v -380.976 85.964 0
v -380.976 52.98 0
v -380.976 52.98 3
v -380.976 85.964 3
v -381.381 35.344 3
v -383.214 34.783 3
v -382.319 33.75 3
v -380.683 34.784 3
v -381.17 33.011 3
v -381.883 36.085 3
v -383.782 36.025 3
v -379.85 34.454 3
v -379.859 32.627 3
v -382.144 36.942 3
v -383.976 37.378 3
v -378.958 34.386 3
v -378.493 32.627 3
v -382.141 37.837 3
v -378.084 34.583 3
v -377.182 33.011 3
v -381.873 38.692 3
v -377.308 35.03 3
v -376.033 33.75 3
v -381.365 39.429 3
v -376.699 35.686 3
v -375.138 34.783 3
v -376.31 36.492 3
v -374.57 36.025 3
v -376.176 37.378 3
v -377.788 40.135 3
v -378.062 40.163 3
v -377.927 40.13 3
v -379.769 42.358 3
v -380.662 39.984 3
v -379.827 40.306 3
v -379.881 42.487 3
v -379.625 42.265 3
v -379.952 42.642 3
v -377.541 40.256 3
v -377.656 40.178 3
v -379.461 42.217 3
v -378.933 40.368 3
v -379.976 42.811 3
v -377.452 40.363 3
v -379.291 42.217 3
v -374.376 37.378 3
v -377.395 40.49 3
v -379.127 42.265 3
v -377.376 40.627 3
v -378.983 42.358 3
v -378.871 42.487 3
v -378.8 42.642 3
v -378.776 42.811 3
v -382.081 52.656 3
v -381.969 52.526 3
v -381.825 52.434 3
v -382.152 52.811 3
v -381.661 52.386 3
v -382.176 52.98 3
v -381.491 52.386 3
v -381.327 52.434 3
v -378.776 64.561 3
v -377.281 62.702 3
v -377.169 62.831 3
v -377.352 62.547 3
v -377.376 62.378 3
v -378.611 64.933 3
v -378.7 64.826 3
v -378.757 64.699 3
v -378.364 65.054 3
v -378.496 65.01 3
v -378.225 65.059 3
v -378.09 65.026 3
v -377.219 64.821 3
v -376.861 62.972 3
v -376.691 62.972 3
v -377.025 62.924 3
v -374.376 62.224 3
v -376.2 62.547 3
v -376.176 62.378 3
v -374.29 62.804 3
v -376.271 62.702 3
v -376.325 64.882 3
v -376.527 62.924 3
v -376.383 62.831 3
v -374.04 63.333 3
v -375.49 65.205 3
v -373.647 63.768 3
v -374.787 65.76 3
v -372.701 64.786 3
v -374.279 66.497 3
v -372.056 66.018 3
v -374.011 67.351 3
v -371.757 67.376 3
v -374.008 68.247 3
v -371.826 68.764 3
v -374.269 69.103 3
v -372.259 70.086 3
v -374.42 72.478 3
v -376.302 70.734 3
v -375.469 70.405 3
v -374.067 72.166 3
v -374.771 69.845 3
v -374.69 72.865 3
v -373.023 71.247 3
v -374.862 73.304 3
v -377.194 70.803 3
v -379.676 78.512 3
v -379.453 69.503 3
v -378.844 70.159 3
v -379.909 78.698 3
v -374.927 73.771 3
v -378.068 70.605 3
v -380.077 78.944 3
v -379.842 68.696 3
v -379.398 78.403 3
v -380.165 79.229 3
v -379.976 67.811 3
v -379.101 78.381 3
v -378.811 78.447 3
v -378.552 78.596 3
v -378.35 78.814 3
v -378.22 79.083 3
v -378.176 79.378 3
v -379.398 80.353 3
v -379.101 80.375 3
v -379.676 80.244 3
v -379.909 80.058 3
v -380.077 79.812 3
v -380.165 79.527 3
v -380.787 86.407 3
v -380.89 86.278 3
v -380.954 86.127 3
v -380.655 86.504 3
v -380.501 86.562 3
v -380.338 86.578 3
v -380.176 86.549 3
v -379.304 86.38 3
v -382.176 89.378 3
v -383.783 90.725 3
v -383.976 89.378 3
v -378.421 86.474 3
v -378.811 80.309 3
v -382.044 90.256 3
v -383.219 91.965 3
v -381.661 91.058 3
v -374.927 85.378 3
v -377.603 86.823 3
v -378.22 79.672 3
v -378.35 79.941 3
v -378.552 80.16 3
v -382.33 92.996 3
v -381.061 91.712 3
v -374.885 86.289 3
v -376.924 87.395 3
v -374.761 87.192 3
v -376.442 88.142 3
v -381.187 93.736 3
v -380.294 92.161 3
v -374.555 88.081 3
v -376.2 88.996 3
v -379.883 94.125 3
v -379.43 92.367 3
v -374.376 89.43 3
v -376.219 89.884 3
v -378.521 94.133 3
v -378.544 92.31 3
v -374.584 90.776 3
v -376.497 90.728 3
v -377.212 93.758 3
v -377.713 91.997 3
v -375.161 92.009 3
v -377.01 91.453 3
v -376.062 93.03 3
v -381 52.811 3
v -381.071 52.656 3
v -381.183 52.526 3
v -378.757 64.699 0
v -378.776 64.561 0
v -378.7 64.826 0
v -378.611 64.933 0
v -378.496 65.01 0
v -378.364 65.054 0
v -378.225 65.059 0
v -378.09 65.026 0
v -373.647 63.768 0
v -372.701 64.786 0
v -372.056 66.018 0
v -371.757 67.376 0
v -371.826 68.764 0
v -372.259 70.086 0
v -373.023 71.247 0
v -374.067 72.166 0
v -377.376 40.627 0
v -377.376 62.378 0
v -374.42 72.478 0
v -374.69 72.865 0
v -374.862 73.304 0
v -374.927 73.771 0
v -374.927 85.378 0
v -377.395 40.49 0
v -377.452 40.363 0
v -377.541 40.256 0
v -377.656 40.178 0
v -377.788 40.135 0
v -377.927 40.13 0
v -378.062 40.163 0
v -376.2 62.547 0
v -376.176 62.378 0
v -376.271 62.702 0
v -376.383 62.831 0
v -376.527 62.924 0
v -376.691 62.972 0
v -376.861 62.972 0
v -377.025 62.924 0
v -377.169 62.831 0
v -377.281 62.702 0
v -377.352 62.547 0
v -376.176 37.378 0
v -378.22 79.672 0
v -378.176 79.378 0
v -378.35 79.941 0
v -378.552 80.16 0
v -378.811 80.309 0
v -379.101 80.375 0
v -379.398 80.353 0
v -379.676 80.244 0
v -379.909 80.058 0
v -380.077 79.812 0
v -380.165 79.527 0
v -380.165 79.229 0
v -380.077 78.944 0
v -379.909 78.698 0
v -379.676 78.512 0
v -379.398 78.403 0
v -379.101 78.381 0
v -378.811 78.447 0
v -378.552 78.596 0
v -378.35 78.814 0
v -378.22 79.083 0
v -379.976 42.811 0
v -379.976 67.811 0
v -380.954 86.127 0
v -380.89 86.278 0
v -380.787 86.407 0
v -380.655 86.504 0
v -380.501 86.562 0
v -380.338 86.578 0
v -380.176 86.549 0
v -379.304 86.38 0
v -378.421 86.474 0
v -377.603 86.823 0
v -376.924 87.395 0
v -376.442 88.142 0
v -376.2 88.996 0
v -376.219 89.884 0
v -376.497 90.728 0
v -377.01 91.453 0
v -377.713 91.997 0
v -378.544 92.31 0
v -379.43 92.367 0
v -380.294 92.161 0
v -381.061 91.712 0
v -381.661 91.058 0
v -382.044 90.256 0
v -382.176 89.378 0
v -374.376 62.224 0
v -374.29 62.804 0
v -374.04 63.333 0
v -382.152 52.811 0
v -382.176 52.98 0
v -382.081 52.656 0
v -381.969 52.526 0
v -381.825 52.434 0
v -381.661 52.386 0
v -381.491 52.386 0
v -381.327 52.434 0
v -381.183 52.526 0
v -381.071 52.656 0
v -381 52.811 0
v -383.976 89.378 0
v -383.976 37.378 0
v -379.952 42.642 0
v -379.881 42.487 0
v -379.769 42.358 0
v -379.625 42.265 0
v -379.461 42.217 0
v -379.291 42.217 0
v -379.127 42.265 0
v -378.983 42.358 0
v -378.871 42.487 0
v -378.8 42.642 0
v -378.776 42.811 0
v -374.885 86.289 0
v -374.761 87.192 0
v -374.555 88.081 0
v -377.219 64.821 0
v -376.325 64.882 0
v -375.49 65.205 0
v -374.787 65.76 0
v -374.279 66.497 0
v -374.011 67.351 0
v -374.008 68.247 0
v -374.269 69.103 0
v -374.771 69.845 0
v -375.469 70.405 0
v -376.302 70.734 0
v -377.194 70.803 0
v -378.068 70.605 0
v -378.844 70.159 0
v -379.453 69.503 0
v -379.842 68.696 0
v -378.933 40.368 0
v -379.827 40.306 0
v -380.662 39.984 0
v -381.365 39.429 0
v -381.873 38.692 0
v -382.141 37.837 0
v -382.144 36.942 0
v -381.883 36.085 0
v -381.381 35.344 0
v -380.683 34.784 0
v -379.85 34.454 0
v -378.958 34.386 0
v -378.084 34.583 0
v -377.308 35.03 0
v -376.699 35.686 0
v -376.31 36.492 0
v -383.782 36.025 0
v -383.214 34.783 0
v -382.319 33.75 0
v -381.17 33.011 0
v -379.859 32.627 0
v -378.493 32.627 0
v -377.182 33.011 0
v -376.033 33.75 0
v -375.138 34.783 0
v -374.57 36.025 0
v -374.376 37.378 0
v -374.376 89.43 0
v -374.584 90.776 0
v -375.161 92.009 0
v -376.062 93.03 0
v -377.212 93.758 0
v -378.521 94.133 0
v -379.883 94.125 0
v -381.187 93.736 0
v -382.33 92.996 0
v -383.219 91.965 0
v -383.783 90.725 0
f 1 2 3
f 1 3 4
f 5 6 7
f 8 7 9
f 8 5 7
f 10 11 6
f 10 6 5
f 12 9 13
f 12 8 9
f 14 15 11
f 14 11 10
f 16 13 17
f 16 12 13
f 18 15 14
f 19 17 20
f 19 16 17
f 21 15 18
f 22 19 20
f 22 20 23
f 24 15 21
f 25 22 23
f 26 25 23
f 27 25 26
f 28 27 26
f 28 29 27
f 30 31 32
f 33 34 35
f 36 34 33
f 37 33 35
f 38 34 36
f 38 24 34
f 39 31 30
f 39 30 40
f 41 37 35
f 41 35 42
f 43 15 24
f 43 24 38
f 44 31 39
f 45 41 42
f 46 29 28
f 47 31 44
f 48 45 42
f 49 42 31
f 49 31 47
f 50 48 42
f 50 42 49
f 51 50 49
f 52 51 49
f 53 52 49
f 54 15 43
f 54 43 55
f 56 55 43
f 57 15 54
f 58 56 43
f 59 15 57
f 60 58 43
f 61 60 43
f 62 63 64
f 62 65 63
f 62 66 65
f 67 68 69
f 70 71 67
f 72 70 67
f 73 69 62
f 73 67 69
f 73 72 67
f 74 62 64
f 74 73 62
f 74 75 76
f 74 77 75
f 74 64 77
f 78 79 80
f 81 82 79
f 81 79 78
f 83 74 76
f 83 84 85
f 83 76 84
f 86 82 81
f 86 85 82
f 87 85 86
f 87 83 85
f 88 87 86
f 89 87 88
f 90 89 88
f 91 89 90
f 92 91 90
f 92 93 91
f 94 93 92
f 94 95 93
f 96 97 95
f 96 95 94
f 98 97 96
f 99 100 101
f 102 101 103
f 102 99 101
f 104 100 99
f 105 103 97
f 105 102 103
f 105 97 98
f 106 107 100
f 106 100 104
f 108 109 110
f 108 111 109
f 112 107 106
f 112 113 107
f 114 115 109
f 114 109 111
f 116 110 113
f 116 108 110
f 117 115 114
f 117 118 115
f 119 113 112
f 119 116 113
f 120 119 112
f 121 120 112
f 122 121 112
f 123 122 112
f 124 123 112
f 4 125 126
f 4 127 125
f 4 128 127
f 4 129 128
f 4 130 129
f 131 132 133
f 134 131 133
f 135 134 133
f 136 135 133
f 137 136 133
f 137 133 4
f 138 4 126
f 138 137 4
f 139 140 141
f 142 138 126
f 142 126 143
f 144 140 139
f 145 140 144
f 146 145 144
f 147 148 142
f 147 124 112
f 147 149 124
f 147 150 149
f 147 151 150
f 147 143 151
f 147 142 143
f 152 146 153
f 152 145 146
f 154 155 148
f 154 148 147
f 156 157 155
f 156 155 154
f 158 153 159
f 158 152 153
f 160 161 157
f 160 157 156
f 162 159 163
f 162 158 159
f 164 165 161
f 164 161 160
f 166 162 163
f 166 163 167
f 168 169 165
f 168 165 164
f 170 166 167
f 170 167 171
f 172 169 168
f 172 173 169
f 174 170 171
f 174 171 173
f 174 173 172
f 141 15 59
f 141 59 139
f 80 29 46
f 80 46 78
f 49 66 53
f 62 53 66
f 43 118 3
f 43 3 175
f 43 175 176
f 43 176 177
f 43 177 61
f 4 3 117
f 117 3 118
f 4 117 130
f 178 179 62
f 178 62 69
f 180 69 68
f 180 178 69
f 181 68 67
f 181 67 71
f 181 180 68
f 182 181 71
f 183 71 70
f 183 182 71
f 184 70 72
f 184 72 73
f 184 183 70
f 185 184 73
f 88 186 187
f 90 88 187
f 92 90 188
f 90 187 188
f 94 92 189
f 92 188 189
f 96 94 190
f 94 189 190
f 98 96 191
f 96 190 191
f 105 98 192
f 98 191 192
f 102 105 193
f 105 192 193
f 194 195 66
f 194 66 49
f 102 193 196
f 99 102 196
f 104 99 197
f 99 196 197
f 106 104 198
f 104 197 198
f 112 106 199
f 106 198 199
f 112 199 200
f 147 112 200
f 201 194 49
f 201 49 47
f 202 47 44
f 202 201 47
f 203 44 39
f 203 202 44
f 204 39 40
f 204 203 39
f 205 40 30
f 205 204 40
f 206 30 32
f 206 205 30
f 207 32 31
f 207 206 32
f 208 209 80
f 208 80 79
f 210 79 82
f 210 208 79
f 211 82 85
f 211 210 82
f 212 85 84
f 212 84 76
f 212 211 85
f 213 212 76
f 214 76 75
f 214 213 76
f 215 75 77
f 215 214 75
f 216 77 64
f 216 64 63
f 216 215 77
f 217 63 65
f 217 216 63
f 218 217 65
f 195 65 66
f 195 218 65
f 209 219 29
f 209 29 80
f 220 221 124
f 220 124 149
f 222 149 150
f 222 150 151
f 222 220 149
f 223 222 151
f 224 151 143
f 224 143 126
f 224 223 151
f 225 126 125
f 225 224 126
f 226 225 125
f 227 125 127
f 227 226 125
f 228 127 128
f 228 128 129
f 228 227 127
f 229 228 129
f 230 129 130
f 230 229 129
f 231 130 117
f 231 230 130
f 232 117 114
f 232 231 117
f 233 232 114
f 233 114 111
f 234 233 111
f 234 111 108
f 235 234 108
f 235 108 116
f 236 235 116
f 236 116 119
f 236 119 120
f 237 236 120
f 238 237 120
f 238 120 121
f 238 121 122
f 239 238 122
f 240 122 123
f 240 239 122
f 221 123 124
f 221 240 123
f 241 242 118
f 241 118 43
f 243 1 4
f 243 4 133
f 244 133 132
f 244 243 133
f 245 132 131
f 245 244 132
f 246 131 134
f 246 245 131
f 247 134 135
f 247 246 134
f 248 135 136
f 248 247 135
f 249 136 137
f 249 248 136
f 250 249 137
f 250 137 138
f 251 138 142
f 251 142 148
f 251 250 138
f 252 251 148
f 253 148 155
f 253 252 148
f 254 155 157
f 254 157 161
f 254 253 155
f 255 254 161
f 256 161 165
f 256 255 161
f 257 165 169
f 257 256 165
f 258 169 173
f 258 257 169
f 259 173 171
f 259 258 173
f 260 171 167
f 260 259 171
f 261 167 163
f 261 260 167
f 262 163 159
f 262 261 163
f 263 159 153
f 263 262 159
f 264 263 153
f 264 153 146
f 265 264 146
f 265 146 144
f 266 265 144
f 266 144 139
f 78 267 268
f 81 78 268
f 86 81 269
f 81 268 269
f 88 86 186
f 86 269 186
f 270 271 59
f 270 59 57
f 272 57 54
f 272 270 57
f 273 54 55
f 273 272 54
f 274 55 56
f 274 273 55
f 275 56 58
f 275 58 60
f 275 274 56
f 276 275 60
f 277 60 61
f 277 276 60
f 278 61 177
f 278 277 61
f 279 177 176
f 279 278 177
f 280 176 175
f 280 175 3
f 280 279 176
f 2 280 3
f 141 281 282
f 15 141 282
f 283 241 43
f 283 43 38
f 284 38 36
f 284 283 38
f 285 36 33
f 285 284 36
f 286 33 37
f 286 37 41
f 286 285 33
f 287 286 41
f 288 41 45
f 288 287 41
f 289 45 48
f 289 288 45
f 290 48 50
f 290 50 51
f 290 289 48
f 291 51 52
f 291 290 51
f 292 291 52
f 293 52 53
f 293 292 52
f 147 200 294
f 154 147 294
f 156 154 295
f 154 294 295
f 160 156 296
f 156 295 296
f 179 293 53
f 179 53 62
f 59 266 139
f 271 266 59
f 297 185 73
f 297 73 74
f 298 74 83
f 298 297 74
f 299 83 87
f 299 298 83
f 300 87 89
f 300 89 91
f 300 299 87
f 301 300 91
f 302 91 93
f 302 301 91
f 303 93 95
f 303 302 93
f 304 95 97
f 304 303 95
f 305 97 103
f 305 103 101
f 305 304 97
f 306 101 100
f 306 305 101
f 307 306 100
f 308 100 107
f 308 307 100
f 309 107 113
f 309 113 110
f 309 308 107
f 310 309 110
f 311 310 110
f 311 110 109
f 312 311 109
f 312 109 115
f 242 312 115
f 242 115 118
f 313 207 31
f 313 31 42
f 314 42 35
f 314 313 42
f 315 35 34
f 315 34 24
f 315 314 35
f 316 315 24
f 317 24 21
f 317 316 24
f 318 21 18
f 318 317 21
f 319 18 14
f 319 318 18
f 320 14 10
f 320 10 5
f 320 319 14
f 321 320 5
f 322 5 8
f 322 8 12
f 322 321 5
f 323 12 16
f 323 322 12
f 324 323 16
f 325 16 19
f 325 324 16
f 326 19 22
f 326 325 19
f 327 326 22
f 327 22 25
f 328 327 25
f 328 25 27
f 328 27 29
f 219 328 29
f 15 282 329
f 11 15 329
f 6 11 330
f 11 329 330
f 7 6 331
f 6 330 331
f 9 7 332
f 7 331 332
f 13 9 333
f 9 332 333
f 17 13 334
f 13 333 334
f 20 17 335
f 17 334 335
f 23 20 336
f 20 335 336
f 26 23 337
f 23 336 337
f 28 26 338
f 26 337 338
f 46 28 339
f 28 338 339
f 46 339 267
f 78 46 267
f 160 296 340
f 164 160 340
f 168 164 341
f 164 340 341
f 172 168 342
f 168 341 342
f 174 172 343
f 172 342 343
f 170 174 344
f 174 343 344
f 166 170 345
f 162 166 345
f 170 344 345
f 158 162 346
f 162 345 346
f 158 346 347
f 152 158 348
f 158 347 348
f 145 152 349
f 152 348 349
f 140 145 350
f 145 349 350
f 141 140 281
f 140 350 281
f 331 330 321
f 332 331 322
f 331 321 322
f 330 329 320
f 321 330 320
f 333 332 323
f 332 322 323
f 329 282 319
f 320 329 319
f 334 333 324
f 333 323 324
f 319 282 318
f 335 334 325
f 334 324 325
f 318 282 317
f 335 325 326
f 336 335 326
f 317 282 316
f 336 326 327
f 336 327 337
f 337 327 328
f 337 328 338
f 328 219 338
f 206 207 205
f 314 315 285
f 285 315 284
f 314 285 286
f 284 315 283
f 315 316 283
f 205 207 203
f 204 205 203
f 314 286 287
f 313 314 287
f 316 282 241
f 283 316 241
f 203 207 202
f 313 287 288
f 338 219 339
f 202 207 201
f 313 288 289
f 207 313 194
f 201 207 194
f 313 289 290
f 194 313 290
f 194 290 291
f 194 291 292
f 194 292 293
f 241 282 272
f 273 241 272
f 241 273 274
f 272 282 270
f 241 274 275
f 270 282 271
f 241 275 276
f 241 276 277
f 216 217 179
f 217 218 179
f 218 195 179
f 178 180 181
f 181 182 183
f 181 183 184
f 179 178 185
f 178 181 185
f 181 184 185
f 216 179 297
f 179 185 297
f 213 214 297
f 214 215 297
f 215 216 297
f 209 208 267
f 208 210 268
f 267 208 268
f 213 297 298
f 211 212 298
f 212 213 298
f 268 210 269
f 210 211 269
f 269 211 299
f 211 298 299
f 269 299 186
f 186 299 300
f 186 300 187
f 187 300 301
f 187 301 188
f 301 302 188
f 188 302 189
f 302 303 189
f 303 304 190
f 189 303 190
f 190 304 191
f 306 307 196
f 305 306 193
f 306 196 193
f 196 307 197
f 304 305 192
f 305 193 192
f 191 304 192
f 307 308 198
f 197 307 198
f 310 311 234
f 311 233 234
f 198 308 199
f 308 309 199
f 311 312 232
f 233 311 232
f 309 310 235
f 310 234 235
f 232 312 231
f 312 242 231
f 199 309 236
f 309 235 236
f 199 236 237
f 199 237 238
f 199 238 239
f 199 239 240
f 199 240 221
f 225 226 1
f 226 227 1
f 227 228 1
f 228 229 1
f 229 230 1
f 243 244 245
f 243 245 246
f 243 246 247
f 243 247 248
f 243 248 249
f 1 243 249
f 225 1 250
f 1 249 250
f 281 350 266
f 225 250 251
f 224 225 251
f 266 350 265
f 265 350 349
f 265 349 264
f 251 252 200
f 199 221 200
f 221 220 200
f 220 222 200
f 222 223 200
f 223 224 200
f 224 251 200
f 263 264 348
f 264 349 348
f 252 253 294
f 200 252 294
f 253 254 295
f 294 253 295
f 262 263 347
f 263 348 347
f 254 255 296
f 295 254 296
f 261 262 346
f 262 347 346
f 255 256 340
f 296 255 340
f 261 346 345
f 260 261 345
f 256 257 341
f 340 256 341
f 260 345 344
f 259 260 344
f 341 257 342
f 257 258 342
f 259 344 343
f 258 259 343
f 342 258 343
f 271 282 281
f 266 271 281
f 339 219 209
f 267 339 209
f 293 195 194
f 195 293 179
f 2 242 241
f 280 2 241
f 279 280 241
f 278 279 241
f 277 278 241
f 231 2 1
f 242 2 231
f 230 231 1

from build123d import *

# Parameters (mm, degrees)
SKETCH_1_R      = 1
EXTRUDE_1_DEPTH = 3


with BuildPart() as part:
    # 草图1 → 凸台-拉伸1 (new body)
    with BuildSketch(Plane.XY):
        with BuildLine():
            Line((-374.926675411, 73.771047931), (-374.926675411, 85.377996683))
            ThreePointArc((-374.926675411, 85.377996683), (-374.833212563, 86.742006081), (-374.554571083, 88.080518639))
            ThreePointArc((-374.554571083, 88.080518639), (-378.521236494, 94.132867012), (-383.975961006, 89.377729178))
            Line((-383.975961006, 89.377729178), (-383.975961006, 52.22545565))
            Line((-383.975961006, 52.22545565), (-383.975961006, 37.377729178))
            ThreePointArc((-383.975961006, 37.377729178), (-379.175961006, 32.577729178), (-374.375961006, 37.377729178))
            Line((-374.375961006, 37.377729178), (-374.375961006, 62.224119392))
            ThreePointArc((-374.375961006, 62.224119392), (-374.18461917, 63.077791251), (-373.647205362, 63.76811997))
            ThreePointArc((-373.647205362, 63.76811997), (-371.745473945, 68.072262412), (-374.066514555, 72.165548992))
            ThreePointArc((-374.066514555, 72.165548992), (-374.68996635, 72.864697969), (-374.926675411, 73.771047931))
        make_face()
        with Locations((-379.175961006, 79.377729178)):
            Circle(SKETCH_1_R, mode=Mode.SUBTRACT)
        with BuildLine():
            Line((-382.175961006, 89.377729178), (-382.175961006, 52.97993897))
            ThreePointArc((-382.175961006, 52.97993897), (-381.575961006, 52.37993897), (-380.975961006, 52.97993897))
            Line((-380.975961006, 52.97993897), (-380.975961006, 85.964352253))
            ThreePointArc((-380.975961006, 85.964352253), (-380.724426098, 86.459873764), (-380.175961006, 86.549302053))
            ThreePointArc((-380.175961006, 86.549302053), (-376.726471263, 91.109779986), (-382.175961006, 89.377729178))
        make_face(mode=Mode.SUBTRACT)
        with BuildLine():
            Line((-378.775961006, 42.811088271), (-378.775961006, 64.56147291))
            ThreePointArc((-378.775961006, 64.56147291), (-378.556266961, 64.975512245), (-378.09024672, 65.025703676))
            ThreePointArc((-378.09024672, 65.025703676), (-374.491724992, 69.492924003), (-379.975961006, 67.811088271))
            Line((-379.975961006, 67.811088271), (-379.975961006, 42.811088271))
            ThreePointArc((-379.975961006, 42.811088271), (-379.375961006, 42.211088271), (-378.775961006, 42.811088271))
        make_face(mode=Mode.SUBTRACT)
        with BuildLine():
            Line((-376.175961006, 37.377729178), (-376.175961006, 62.377729178))
            ThreePointArc((-376.175961006, 62.377729178), (-376.775961006, 62.977729178), (-377.375961006, 62.377729178))
            Line((-377.375961006, 62.377729178), (-377.375961006, 40.62734454))
            ThreePointArc((-377.375961006, 40.62734454), (-377.59565505, 40.213305204), (-378.061675291, 40.163113774))
            ThreePointArc((-378.061675291, 40.163113774), (-381.660197019, 35.695893446), (-376.175961006, 37.377729178))
        make_face(mode=Mode.SUBTRACT)
    extrude(amount=EXTRUDE_1_DEPTH)


solid = part.part
